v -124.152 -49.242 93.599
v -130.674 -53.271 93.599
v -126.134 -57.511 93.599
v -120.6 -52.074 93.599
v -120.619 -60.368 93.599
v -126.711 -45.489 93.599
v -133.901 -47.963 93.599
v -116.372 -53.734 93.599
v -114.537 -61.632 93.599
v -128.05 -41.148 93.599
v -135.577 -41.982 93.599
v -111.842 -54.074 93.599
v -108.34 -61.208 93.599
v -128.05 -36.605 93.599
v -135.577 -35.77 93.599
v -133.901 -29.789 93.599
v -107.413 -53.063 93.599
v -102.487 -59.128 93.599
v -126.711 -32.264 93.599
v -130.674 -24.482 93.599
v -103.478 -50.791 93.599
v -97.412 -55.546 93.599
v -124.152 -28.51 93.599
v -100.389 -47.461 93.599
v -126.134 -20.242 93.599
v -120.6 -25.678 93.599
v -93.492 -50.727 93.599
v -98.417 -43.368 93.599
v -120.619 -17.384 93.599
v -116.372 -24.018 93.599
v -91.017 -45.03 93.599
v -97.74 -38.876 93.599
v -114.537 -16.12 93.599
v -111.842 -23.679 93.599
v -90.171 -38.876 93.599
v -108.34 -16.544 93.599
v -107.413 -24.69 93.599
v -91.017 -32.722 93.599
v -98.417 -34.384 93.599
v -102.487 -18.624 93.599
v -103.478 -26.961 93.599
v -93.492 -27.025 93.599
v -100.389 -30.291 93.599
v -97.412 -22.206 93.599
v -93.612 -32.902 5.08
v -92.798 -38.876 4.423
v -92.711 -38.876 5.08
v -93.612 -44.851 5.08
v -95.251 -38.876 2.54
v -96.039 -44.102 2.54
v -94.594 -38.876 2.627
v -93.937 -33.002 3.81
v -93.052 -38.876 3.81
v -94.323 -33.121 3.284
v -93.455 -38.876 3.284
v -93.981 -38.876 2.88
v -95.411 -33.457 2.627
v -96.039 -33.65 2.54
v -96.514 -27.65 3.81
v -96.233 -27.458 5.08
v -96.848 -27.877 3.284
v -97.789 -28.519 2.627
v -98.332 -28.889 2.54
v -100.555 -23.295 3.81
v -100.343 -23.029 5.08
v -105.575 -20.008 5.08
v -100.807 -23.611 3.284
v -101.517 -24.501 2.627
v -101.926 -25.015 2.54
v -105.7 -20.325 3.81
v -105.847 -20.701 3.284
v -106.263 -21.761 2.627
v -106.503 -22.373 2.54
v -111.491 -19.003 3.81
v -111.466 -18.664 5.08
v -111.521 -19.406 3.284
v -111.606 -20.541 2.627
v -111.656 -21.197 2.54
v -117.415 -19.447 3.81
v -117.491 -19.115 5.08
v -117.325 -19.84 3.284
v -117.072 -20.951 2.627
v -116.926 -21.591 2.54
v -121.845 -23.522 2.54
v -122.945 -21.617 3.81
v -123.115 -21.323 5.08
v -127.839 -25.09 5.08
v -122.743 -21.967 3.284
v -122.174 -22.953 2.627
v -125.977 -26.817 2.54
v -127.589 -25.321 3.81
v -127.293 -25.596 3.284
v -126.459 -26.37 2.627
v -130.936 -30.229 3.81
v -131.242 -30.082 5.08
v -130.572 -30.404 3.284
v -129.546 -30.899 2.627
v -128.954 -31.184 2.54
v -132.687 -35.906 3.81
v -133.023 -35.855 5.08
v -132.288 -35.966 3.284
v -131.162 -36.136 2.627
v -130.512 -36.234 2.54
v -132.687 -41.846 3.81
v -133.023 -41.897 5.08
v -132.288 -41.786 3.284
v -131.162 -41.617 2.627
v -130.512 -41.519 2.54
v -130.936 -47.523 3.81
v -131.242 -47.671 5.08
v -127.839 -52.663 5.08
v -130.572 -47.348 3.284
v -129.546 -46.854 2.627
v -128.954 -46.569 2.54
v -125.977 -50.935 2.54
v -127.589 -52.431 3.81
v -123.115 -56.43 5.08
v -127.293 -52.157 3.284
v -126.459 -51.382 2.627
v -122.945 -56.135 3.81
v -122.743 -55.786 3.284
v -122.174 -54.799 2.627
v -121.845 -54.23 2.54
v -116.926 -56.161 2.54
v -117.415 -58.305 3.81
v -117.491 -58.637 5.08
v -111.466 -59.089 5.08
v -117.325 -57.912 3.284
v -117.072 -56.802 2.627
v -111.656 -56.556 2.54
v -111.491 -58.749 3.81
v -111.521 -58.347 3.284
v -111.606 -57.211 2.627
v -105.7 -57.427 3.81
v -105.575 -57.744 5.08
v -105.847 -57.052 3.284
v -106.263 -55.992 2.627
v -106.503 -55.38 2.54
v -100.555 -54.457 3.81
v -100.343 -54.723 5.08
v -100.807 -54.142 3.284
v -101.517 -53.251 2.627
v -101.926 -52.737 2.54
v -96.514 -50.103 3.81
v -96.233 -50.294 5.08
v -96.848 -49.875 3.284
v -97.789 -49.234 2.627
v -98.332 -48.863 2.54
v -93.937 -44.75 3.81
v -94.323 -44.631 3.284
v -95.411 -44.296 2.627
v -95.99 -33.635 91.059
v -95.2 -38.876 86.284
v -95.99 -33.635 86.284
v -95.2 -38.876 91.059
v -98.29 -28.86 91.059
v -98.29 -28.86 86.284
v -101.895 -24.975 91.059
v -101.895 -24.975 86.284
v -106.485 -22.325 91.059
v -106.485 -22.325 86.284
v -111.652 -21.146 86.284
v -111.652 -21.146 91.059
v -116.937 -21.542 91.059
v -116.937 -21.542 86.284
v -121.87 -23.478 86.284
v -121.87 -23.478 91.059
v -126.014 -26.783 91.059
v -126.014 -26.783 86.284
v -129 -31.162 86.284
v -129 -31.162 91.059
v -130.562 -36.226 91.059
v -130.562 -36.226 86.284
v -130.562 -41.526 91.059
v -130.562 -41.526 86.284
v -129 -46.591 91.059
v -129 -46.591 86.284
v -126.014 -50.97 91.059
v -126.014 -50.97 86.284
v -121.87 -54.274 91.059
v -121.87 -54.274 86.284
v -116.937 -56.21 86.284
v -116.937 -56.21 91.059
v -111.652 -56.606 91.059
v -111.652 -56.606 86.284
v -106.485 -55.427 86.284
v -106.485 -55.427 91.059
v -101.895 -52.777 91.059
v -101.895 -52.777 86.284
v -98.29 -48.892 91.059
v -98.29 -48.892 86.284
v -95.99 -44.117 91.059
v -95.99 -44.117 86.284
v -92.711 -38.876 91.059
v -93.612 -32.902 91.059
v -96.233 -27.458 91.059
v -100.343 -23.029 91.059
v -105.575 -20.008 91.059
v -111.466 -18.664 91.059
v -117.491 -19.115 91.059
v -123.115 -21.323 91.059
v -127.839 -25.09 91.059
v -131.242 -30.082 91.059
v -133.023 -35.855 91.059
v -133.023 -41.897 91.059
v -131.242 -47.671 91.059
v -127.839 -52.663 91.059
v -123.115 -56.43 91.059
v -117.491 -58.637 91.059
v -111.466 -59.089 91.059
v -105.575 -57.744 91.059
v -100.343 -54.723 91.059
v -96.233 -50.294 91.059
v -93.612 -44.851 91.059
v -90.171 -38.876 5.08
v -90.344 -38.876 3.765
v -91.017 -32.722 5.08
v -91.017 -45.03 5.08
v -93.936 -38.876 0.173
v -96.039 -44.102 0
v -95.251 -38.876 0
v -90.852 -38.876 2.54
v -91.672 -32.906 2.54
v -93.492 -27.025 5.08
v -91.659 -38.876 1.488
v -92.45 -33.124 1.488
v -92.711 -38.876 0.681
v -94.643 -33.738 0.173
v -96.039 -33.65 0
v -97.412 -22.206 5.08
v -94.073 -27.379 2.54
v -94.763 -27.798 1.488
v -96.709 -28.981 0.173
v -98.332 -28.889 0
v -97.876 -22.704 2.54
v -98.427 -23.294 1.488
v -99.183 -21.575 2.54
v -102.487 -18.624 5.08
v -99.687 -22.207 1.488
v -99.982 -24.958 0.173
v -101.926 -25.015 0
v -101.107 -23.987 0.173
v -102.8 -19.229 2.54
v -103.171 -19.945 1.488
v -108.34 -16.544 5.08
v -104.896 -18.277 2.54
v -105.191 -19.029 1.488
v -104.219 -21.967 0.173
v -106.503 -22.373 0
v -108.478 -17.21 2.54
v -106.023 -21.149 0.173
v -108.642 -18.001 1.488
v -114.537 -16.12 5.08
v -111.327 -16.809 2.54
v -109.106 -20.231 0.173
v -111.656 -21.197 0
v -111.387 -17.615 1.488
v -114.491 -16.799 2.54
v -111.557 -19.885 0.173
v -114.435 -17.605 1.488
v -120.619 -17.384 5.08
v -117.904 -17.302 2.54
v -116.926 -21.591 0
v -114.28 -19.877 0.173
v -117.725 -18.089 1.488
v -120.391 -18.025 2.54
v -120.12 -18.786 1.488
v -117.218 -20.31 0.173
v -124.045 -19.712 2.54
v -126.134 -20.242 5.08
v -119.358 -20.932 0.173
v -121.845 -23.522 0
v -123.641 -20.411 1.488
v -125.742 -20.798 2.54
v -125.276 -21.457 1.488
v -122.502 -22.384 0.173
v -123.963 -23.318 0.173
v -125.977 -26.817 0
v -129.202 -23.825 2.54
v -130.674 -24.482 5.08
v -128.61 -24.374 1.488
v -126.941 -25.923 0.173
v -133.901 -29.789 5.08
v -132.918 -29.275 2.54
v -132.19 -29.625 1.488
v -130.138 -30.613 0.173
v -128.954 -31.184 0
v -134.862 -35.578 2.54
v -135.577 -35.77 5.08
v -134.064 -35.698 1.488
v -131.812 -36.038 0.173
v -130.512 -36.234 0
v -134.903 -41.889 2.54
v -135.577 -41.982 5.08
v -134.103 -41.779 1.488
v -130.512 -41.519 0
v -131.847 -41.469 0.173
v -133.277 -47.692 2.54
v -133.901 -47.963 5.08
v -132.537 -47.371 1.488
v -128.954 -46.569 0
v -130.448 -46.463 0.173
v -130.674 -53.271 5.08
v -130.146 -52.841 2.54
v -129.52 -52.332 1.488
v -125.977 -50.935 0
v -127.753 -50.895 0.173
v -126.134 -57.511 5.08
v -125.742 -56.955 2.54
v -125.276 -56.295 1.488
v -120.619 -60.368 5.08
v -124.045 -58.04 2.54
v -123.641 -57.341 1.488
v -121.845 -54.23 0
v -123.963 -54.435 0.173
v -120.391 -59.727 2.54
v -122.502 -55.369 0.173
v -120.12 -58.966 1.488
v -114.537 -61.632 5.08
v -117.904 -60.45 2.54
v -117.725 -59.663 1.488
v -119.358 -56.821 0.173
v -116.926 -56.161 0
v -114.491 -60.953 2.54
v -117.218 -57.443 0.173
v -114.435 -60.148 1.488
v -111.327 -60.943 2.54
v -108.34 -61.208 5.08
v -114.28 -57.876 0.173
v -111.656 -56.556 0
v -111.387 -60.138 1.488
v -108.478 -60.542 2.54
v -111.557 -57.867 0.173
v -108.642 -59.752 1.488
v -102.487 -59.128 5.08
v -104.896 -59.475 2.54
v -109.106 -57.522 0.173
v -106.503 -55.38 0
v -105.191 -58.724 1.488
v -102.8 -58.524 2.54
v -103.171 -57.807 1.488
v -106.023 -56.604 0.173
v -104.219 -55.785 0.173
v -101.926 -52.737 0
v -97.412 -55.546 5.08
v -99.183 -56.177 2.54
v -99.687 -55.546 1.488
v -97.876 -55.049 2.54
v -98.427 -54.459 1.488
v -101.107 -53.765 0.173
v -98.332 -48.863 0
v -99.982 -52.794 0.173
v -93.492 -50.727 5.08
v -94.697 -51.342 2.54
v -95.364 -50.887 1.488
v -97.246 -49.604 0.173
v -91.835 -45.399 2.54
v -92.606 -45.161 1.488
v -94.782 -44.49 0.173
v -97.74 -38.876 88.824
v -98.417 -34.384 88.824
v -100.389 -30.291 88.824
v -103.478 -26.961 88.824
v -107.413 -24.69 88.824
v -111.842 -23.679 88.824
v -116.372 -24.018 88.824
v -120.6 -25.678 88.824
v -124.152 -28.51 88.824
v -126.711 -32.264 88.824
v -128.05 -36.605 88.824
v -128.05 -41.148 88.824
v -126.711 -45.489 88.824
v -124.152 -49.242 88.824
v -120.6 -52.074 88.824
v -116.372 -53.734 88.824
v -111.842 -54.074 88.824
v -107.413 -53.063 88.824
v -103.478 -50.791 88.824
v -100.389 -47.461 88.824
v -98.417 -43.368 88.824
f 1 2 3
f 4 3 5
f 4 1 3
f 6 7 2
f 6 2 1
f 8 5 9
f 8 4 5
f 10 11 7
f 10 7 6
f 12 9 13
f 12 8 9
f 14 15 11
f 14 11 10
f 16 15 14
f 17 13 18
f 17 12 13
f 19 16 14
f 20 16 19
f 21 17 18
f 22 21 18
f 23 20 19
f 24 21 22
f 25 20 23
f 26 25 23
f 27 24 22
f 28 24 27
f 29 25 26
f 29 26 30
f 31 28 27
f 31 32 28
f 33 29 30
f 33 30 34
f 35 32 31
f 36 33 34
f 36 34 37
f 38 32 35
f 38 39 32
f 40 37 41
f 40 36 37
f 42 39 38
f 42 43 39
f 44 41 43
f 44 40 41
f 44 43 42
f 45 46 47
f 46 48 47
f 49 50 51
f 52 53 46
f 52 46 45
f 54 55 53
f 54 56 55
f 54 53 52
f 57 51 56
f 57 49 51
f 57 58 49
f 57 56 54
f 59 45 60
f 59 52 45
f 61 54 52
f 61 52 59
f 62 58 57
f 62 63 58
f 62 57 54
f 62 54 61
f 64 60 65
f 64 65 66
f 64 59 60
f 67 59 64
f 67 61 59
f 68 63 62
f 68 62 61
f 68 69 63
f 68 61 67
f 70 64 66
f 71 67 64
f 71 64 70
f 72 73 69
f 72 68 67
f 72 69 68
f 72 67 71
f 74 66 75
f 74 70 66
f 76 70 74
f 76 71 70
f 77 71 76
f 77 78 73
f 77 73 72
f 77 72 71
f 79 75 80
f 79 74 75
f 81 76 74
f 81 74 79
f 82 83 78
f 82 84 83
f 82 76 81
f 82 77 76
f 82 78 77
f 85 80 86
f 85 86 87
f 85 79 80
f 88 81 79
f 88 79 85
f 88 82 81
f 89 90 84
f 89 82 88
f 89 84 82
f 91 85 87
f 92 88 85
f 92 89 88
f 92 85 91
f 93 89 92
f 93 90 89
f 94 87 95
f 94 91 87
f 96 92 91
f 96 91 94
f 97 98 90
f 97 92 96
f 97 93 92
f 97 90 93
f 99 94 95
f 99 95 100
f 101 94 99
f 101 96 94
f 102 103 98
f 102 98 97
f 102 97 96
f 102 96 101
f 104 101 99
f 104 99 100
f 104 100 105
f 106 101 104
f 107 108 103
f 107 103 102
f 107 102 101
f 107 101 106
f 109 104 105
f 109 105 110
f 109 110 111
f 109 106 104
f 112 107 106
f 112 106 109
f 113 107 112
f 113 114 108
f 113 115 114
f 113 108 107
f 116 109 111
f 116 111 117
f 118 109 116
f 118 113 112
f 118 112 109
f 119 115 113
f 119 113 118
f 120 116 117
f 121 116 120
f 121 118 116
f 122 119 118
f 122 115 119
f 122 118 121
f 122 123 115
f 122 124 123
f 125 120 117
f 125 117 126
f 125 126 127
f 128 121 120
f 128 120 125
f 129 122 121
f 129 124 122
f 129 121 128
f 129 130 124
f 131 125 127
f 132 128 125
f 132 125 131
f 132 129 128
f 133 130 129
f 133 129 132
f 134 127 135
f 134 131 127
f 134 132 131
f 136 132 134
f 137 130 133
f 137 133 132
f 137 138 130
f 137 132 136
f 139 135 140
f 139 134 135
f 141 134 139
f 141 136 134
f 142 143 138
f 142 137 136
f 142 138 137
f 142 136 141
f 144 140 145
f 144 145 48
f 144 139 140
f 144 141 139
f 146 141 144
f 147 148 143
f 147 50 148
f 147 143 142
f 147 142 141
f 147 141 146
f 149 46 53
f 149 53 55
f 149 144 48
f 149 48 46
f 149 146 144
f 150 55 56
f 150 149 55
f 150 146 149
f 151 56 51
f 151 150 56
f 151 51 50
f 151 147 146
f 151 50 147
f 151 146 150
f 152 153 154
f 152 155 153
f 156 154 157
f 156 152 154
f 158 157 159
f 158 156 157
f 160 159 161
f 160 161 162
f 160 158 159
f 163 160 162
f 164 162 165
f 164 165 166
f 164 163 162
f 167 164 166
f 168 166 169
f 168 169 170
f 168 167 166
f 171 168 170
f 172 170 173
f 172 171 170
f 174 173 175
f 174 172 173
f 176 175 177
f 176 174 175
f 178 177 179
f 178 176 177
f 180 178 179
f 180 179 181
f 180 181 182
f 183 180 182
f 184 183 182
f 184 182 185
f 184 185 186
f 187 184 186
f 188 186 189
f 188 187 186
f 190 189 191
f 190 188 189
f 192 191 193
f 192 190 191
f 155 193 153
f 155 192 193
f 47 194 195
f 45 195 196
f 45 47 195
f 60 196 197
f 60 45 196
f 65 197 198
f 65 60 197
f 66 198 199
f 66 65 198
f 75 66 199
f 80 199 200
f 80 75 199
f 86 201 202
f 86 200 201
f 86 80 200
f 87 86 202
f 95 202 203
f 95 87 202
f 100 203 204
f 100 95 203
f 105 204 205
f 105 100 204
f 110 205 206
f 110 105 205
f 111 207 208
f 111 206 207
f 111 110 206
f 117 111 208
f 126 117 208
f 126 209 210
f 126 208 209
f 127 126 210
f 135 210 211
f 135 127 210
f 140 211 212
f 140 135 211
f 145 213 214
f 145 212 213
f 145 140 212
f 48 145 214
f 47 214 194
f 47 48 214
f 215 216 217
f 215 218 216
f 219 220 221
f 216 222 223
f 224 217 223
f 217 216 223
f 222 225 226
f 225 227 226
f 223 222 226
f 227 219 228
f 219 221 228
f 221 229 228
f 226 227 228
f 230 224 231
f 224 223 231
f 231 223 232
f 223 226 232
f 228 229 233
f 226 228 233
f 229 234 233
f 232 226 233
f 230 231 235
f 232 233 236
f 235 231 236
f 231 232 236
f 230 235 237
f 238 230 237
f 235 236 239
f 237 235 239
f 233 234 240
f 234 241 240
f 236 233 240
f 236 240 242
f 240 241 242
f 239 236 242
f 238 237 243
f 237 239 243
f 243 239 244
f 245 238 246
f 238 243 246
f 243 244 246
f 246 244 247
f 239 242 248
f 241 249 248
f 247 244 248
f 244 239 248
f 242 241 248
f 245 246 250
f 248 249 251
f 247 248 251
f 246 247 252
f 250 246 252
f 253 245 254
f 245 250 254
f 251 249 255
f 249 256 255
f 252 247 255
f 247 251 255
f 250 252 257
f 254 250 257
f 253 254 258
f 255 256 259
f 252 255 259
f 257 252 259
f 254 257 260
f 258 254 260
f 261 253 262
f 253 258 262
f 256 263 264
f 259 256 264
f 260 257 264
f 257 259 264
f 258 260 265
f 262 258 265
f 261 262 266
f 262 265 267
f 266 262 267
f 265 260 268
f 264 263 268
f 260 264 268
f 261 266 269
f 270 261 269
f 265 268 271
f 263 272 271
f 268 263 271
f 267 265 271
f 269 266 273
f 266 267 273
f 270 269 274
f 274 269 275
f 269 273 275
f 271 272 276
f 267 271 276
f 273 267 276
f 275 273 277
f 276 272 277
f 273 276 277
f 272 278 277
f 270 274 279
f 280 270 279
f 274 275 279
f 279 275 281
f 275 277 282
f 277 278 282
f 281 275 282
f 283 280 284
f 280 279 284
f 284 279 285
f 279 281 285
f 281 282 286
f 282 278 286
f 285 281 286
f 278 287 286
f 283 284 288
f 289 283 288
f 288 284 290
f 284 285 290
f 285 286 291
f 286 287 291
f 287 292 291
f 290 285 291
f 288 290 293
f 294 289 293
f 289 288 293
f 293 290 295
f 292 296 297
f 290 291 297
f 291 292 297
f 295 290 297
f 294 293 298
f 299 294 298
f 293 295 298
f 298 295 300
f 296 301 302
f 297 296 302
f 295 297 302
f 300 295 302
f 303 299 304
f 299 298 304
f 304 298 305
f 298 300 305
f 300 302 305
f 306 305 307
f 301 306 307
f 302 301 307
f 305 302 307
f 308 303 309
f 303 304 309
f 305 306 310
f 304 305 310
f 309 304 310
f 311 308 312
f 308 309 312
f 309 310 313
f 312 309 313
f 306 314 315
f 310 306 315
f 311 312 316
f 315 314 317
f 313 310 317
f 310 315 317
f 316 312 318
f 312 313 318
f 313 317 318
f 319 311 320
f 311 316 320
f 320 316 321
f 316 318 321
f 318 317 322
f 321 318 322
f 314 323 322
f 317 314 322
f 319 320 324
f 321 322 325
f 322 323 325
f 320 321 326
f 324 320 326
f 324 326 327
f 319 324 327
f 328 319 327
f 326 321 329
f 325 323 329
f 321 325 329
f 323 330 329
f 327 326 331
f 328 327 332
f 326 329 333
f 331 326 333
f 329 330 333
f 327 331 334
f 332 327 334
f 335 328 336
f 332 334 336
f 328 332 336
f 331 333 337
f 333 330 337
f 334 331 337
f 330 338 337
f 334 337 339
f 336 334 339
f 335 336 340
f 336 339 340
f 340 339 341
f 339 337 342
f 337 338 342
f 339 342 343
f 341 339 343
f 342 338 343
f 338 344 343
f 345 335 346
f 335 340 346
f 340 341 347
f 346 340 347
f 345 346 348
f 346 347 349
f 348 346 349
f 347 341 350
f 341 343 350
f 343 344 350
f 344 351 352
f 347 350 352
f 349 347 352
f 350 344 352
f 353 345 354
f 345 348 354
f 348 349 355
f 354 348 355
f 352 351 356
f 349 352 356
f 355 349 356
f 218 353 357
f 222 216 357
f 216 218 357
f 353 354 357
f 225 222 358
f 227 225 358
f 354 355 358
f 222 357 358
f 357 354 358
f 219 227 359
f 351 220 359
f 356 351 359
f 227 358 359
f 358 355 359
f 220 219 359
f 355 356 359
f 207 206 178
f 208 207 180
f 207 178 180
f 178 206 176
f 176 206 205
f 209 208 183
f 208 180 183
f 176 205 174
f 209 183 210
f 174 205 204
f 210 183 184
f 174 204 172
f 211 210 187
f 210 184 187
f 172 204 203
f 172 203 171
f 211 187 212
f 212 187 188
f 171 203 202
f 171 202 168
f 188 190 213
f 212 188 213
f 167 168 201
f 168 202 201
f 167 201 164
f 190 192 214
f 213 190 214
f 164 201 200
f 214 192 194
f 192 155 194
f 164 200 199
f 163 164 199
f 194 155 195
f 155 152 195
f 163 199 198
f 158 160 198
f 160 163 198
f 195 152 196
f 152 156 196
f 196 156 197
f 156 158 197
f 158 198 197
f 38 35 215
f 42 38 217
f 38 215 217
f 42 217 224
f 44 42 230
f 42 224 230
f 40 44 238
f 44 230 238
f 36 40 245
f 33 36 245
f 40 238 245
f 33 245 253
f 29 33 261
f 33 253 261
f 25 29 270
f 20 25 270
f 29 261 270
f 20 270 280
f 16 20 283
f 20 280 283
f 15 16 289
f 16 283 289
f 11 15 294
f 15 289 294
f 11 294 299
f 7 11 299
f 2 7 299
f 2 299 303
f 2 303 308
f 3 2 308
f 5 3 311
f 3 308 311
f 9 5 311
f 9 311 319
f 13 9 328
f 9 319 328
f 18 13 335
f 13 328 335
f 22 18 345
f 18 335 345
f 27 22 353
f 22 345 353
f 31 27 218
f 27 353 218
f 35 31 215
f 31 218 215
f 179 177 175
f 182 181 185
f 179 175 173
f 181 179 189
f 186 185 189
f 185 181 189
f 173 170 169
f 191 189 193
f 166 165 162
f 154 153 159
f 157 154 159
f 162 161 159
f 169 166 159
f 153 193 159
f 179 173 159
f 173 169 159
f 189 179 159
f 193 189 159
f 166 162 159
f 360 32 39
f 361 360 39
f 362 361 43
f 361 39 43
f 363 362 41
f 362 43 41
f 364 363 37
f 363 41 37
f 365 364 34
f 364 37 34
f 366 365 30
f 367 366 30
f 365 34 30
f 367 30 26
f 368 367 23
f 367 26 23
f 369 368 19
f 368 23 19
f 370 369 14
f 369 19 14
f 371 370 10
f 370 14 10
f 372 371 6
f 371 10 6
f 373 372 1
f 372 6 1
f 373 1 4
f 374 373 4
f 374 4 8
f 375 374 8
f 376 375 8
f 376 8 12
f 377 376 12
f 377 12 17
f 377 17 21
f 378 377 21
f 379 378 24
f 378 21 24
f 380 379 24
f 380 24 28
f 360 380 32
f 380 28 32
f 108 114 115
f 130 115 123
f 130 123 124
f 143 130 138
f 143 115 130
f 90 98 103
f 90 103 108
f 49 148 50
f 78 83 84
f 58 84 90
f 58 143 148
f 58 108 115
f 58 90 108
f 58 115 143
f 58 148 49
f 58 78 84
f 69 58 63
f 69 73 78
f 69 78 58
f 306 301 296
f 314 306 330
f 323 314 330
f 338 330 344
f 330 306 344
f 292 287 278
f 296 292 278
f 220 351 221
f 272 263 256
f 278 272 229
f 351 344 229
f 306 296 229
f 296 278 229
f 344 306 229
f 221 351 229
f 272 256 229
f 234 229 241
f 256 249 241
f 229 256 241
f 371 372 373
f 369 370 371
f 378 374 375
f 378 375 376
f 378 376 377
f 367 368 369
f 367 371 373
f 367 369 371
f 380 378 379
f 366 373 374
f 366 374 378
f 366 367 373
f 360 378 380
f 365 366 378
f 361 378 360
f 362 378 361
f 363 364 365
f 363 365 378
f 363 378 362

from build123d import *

# Parameters (mm, degrees)
F0_R     = 22.8092
F1_DEPTH = 93.599
F2_R     = 15.24
F3_DEPTH = 4.7752
F4_R     = 5.08
F5_T     = -2.54


with BuildPart() as f1:
    # F0 (on Top) → F1 (new body)
    with BuildSketch(Plane.XY):
        with Locations((-112.9804104567, -38.8761870563)):
            Circle(F0_R)
    extrude(amount=F1_DEPTH)

    # F2 (on face) → F3 (cut)
    with BuildSketch(Plane.XY.offset(93.599)):
        with Locations((-112.9804104567, -38.8761870563)):
            Circle(F2_R)
    extrude(amount=-F3_DEPTH, mode=Mode.SUBTRACT)

    # F4
    f4_edges = [f1.edges().sort_by_distance(p)[0] for p in [
        (-135.78961, -38.876187, 0),
    ]]
    fillet(f4_edges, radius=F4_R)

    # F5 (hollow: no face is removed)
    offset(amount=F5_T, kind=Kind.INTERSECTION, mode=Mode.SUBTRACT)


solid = f1.part
